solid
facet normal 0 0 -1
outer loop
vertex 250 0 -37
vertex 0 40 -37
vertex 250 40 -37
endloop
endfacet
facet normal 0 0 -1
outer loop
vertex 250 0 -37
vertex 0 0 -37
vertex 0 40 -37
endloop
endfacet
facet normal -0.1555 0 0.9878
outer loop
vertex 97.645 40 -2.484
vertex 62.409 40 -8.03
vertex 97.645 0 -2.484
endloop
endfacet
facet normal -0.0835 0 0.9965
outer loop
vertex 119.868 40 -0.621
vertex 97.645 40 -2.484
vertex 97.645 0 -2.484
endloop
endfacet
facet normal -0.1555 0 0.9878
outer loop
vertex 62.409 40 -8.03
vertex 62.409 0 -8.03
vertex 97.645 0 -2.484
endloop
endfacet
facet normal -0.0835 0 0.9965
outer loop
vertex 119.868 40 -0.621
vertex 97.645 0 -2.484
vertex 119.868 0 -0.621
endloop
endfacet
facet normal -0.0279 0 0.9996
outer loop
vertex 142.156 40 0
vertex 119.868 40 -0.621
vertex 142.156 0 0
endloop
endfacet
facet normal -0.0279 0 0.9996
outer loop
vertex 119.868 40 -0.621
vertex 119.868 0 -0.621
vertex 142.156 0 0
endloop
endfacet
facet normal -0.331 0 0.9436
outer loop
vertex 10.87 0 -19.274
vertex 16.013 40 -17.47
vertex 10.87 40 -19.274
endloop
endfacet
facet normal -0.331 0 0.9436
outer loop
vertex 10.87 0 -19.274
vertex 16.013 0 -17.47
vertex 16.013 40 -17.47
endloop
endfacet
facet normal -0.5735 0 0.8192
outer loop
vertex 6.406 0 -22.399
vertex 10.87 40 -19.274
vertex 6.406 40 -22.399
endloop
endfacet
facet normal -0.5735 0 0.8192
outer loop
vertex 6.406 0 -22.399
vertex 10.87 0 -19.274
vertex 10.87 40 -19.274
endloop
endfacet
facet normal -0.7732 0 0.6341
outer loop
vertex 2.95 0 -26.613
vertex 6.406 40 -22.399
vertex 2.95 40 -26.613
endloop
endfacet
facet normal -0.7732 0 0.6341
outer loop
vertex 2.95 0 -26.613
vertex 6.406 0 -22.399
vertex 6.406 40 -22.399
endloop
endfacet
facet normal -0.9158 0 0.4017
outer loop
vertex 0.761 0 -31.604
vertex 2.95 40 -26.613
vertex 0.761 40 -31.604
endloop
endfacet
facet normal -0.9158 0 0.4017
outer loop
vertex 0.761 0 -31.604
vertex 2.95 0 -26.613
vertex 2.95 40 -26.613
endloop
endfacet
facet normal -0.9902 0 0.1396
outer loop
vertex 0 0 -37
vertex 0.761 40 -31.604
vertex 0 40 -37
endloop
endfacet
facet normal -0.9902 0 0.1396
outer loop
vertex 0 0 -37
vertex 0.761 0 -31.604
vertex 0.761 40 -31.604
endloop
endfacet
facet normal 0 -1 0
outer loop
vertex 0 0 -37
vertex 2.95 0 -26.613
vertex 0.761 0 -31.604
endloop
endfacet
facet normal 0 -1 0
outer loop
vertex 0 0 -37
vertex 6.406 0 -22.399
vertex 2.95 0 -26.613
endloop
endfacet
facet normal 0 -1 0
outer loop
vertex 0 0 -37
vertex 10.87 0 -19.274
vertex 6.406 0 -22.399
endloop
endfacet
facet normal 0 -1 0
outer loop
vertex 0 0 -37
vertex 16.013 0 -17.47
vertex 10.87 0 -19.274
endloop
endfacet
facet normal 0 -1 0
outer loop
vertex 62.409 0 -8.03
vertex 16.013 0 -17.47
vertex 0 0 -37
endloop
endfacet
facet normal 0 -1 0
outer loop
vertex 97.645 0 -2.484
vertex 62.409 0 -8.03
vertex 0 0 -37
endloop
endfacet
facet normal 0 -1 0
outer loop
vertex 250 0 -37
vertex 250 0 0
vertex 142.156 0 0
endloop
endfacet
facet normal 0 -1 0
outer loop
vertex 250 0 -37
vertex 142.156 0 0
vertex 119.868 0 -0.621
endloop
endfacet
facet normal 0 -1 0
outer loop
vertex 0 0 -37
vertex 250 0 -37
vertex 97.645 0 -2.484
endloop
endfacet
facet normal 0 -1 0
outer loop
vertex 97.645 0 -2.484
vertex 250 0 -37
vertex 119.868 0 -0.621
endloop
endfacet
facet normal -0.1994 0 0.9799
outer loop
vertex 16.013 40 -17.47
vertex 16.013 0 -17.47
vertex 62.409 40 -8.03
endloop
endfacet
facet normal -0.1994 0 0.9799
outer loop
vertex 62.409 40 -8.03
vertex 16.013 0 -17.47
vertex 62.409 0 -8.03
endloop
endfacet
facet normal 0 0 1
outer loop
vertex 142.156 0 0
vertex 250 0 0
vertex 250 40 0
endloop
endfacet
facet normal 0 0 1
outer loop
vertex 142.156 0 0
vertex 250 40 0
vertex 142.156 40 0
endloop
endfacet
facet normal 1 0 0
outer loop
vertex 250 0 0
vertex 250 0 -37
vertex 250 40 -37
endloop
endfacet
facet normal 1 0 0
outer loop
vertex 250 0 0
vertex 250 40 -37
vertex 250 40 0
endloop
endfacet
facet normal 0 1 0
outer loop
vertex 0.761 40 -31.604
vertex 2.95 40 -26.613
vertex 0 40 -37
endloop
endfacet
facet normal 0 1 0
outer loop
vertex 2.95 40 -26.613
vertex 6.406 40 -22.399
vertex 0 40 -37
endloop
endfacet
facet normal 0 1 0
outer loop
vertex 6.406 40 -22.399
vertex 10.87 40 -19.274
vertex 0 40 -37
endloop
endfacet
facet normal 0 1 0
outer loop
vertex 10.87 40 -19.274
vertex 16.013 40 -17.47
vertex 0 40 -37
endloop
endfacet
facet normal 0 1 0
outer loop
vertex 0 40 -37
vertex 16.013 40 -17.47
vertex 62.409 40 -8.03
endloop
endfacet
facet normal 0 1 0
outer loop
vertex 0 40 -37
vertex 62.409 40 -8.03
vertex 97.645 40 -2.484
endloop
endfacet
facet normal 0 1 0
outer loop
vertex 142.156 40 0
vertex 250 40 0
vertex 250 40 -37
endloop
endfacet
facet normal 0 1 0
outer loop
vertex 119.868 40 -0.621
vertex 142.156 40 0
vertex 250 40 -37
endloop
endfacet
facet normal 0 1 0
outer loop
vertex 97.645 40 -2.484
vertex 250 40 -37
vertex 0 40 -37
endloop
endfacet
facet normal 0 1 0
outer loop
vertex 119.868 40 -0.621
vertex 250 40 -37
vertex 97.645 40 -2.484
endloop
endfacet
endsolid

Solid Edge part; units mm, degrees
sketch "Sketch1" plane through (0, 0, 0) normal (0, -1, 0) x (1, 0, 0)
  line L0 (0, -37) -> (250, -37)
  line L1 (250, -37) -> (250, 0)
  line L2 (250, 0) -> (0, 0)
  line L3 (0, 0) -> (0, -37)
extrude "Protrusion1" add sketch "Sketch1" against normal blind 40
sketch "Sketch2" plane through (125, 0, -18.5) normal (0, -1, 0) x (1, 0, 0)
  arc A0 (10, 18.5) -> (-125, -2.2274) centre (10, -431.5) ccw
  line L0 (-125, -2.2274) -> (-125, 18.5)
  line L1 (-125, 18.5) -> (10, 18.5)
extrude "ExtrudedCutout_1" cut sketch "Sketch2" against normal blind 40
sketch "Sketch3" plane through (125, 0, -18.5) normal (0, -1, 0) x (1, 0, 0)
  line L0 (-125, -2.2274) -> (-33.462, 16.3963)
  line L1 (-33.462, 16.3963) -> (-125, 18.5)
  line L2 (-125, 18.5) -> (-125, -2.2274)
extrude "ExtrudedCutout_2" cut sketch "Sketch3" against normal blind 40
fillet "Round_1" radius 20 1 edges at (0, 20, -20.7274)
fillet "Round_2" radius 400 1 edges at (91.538, 20, -2.1037)
